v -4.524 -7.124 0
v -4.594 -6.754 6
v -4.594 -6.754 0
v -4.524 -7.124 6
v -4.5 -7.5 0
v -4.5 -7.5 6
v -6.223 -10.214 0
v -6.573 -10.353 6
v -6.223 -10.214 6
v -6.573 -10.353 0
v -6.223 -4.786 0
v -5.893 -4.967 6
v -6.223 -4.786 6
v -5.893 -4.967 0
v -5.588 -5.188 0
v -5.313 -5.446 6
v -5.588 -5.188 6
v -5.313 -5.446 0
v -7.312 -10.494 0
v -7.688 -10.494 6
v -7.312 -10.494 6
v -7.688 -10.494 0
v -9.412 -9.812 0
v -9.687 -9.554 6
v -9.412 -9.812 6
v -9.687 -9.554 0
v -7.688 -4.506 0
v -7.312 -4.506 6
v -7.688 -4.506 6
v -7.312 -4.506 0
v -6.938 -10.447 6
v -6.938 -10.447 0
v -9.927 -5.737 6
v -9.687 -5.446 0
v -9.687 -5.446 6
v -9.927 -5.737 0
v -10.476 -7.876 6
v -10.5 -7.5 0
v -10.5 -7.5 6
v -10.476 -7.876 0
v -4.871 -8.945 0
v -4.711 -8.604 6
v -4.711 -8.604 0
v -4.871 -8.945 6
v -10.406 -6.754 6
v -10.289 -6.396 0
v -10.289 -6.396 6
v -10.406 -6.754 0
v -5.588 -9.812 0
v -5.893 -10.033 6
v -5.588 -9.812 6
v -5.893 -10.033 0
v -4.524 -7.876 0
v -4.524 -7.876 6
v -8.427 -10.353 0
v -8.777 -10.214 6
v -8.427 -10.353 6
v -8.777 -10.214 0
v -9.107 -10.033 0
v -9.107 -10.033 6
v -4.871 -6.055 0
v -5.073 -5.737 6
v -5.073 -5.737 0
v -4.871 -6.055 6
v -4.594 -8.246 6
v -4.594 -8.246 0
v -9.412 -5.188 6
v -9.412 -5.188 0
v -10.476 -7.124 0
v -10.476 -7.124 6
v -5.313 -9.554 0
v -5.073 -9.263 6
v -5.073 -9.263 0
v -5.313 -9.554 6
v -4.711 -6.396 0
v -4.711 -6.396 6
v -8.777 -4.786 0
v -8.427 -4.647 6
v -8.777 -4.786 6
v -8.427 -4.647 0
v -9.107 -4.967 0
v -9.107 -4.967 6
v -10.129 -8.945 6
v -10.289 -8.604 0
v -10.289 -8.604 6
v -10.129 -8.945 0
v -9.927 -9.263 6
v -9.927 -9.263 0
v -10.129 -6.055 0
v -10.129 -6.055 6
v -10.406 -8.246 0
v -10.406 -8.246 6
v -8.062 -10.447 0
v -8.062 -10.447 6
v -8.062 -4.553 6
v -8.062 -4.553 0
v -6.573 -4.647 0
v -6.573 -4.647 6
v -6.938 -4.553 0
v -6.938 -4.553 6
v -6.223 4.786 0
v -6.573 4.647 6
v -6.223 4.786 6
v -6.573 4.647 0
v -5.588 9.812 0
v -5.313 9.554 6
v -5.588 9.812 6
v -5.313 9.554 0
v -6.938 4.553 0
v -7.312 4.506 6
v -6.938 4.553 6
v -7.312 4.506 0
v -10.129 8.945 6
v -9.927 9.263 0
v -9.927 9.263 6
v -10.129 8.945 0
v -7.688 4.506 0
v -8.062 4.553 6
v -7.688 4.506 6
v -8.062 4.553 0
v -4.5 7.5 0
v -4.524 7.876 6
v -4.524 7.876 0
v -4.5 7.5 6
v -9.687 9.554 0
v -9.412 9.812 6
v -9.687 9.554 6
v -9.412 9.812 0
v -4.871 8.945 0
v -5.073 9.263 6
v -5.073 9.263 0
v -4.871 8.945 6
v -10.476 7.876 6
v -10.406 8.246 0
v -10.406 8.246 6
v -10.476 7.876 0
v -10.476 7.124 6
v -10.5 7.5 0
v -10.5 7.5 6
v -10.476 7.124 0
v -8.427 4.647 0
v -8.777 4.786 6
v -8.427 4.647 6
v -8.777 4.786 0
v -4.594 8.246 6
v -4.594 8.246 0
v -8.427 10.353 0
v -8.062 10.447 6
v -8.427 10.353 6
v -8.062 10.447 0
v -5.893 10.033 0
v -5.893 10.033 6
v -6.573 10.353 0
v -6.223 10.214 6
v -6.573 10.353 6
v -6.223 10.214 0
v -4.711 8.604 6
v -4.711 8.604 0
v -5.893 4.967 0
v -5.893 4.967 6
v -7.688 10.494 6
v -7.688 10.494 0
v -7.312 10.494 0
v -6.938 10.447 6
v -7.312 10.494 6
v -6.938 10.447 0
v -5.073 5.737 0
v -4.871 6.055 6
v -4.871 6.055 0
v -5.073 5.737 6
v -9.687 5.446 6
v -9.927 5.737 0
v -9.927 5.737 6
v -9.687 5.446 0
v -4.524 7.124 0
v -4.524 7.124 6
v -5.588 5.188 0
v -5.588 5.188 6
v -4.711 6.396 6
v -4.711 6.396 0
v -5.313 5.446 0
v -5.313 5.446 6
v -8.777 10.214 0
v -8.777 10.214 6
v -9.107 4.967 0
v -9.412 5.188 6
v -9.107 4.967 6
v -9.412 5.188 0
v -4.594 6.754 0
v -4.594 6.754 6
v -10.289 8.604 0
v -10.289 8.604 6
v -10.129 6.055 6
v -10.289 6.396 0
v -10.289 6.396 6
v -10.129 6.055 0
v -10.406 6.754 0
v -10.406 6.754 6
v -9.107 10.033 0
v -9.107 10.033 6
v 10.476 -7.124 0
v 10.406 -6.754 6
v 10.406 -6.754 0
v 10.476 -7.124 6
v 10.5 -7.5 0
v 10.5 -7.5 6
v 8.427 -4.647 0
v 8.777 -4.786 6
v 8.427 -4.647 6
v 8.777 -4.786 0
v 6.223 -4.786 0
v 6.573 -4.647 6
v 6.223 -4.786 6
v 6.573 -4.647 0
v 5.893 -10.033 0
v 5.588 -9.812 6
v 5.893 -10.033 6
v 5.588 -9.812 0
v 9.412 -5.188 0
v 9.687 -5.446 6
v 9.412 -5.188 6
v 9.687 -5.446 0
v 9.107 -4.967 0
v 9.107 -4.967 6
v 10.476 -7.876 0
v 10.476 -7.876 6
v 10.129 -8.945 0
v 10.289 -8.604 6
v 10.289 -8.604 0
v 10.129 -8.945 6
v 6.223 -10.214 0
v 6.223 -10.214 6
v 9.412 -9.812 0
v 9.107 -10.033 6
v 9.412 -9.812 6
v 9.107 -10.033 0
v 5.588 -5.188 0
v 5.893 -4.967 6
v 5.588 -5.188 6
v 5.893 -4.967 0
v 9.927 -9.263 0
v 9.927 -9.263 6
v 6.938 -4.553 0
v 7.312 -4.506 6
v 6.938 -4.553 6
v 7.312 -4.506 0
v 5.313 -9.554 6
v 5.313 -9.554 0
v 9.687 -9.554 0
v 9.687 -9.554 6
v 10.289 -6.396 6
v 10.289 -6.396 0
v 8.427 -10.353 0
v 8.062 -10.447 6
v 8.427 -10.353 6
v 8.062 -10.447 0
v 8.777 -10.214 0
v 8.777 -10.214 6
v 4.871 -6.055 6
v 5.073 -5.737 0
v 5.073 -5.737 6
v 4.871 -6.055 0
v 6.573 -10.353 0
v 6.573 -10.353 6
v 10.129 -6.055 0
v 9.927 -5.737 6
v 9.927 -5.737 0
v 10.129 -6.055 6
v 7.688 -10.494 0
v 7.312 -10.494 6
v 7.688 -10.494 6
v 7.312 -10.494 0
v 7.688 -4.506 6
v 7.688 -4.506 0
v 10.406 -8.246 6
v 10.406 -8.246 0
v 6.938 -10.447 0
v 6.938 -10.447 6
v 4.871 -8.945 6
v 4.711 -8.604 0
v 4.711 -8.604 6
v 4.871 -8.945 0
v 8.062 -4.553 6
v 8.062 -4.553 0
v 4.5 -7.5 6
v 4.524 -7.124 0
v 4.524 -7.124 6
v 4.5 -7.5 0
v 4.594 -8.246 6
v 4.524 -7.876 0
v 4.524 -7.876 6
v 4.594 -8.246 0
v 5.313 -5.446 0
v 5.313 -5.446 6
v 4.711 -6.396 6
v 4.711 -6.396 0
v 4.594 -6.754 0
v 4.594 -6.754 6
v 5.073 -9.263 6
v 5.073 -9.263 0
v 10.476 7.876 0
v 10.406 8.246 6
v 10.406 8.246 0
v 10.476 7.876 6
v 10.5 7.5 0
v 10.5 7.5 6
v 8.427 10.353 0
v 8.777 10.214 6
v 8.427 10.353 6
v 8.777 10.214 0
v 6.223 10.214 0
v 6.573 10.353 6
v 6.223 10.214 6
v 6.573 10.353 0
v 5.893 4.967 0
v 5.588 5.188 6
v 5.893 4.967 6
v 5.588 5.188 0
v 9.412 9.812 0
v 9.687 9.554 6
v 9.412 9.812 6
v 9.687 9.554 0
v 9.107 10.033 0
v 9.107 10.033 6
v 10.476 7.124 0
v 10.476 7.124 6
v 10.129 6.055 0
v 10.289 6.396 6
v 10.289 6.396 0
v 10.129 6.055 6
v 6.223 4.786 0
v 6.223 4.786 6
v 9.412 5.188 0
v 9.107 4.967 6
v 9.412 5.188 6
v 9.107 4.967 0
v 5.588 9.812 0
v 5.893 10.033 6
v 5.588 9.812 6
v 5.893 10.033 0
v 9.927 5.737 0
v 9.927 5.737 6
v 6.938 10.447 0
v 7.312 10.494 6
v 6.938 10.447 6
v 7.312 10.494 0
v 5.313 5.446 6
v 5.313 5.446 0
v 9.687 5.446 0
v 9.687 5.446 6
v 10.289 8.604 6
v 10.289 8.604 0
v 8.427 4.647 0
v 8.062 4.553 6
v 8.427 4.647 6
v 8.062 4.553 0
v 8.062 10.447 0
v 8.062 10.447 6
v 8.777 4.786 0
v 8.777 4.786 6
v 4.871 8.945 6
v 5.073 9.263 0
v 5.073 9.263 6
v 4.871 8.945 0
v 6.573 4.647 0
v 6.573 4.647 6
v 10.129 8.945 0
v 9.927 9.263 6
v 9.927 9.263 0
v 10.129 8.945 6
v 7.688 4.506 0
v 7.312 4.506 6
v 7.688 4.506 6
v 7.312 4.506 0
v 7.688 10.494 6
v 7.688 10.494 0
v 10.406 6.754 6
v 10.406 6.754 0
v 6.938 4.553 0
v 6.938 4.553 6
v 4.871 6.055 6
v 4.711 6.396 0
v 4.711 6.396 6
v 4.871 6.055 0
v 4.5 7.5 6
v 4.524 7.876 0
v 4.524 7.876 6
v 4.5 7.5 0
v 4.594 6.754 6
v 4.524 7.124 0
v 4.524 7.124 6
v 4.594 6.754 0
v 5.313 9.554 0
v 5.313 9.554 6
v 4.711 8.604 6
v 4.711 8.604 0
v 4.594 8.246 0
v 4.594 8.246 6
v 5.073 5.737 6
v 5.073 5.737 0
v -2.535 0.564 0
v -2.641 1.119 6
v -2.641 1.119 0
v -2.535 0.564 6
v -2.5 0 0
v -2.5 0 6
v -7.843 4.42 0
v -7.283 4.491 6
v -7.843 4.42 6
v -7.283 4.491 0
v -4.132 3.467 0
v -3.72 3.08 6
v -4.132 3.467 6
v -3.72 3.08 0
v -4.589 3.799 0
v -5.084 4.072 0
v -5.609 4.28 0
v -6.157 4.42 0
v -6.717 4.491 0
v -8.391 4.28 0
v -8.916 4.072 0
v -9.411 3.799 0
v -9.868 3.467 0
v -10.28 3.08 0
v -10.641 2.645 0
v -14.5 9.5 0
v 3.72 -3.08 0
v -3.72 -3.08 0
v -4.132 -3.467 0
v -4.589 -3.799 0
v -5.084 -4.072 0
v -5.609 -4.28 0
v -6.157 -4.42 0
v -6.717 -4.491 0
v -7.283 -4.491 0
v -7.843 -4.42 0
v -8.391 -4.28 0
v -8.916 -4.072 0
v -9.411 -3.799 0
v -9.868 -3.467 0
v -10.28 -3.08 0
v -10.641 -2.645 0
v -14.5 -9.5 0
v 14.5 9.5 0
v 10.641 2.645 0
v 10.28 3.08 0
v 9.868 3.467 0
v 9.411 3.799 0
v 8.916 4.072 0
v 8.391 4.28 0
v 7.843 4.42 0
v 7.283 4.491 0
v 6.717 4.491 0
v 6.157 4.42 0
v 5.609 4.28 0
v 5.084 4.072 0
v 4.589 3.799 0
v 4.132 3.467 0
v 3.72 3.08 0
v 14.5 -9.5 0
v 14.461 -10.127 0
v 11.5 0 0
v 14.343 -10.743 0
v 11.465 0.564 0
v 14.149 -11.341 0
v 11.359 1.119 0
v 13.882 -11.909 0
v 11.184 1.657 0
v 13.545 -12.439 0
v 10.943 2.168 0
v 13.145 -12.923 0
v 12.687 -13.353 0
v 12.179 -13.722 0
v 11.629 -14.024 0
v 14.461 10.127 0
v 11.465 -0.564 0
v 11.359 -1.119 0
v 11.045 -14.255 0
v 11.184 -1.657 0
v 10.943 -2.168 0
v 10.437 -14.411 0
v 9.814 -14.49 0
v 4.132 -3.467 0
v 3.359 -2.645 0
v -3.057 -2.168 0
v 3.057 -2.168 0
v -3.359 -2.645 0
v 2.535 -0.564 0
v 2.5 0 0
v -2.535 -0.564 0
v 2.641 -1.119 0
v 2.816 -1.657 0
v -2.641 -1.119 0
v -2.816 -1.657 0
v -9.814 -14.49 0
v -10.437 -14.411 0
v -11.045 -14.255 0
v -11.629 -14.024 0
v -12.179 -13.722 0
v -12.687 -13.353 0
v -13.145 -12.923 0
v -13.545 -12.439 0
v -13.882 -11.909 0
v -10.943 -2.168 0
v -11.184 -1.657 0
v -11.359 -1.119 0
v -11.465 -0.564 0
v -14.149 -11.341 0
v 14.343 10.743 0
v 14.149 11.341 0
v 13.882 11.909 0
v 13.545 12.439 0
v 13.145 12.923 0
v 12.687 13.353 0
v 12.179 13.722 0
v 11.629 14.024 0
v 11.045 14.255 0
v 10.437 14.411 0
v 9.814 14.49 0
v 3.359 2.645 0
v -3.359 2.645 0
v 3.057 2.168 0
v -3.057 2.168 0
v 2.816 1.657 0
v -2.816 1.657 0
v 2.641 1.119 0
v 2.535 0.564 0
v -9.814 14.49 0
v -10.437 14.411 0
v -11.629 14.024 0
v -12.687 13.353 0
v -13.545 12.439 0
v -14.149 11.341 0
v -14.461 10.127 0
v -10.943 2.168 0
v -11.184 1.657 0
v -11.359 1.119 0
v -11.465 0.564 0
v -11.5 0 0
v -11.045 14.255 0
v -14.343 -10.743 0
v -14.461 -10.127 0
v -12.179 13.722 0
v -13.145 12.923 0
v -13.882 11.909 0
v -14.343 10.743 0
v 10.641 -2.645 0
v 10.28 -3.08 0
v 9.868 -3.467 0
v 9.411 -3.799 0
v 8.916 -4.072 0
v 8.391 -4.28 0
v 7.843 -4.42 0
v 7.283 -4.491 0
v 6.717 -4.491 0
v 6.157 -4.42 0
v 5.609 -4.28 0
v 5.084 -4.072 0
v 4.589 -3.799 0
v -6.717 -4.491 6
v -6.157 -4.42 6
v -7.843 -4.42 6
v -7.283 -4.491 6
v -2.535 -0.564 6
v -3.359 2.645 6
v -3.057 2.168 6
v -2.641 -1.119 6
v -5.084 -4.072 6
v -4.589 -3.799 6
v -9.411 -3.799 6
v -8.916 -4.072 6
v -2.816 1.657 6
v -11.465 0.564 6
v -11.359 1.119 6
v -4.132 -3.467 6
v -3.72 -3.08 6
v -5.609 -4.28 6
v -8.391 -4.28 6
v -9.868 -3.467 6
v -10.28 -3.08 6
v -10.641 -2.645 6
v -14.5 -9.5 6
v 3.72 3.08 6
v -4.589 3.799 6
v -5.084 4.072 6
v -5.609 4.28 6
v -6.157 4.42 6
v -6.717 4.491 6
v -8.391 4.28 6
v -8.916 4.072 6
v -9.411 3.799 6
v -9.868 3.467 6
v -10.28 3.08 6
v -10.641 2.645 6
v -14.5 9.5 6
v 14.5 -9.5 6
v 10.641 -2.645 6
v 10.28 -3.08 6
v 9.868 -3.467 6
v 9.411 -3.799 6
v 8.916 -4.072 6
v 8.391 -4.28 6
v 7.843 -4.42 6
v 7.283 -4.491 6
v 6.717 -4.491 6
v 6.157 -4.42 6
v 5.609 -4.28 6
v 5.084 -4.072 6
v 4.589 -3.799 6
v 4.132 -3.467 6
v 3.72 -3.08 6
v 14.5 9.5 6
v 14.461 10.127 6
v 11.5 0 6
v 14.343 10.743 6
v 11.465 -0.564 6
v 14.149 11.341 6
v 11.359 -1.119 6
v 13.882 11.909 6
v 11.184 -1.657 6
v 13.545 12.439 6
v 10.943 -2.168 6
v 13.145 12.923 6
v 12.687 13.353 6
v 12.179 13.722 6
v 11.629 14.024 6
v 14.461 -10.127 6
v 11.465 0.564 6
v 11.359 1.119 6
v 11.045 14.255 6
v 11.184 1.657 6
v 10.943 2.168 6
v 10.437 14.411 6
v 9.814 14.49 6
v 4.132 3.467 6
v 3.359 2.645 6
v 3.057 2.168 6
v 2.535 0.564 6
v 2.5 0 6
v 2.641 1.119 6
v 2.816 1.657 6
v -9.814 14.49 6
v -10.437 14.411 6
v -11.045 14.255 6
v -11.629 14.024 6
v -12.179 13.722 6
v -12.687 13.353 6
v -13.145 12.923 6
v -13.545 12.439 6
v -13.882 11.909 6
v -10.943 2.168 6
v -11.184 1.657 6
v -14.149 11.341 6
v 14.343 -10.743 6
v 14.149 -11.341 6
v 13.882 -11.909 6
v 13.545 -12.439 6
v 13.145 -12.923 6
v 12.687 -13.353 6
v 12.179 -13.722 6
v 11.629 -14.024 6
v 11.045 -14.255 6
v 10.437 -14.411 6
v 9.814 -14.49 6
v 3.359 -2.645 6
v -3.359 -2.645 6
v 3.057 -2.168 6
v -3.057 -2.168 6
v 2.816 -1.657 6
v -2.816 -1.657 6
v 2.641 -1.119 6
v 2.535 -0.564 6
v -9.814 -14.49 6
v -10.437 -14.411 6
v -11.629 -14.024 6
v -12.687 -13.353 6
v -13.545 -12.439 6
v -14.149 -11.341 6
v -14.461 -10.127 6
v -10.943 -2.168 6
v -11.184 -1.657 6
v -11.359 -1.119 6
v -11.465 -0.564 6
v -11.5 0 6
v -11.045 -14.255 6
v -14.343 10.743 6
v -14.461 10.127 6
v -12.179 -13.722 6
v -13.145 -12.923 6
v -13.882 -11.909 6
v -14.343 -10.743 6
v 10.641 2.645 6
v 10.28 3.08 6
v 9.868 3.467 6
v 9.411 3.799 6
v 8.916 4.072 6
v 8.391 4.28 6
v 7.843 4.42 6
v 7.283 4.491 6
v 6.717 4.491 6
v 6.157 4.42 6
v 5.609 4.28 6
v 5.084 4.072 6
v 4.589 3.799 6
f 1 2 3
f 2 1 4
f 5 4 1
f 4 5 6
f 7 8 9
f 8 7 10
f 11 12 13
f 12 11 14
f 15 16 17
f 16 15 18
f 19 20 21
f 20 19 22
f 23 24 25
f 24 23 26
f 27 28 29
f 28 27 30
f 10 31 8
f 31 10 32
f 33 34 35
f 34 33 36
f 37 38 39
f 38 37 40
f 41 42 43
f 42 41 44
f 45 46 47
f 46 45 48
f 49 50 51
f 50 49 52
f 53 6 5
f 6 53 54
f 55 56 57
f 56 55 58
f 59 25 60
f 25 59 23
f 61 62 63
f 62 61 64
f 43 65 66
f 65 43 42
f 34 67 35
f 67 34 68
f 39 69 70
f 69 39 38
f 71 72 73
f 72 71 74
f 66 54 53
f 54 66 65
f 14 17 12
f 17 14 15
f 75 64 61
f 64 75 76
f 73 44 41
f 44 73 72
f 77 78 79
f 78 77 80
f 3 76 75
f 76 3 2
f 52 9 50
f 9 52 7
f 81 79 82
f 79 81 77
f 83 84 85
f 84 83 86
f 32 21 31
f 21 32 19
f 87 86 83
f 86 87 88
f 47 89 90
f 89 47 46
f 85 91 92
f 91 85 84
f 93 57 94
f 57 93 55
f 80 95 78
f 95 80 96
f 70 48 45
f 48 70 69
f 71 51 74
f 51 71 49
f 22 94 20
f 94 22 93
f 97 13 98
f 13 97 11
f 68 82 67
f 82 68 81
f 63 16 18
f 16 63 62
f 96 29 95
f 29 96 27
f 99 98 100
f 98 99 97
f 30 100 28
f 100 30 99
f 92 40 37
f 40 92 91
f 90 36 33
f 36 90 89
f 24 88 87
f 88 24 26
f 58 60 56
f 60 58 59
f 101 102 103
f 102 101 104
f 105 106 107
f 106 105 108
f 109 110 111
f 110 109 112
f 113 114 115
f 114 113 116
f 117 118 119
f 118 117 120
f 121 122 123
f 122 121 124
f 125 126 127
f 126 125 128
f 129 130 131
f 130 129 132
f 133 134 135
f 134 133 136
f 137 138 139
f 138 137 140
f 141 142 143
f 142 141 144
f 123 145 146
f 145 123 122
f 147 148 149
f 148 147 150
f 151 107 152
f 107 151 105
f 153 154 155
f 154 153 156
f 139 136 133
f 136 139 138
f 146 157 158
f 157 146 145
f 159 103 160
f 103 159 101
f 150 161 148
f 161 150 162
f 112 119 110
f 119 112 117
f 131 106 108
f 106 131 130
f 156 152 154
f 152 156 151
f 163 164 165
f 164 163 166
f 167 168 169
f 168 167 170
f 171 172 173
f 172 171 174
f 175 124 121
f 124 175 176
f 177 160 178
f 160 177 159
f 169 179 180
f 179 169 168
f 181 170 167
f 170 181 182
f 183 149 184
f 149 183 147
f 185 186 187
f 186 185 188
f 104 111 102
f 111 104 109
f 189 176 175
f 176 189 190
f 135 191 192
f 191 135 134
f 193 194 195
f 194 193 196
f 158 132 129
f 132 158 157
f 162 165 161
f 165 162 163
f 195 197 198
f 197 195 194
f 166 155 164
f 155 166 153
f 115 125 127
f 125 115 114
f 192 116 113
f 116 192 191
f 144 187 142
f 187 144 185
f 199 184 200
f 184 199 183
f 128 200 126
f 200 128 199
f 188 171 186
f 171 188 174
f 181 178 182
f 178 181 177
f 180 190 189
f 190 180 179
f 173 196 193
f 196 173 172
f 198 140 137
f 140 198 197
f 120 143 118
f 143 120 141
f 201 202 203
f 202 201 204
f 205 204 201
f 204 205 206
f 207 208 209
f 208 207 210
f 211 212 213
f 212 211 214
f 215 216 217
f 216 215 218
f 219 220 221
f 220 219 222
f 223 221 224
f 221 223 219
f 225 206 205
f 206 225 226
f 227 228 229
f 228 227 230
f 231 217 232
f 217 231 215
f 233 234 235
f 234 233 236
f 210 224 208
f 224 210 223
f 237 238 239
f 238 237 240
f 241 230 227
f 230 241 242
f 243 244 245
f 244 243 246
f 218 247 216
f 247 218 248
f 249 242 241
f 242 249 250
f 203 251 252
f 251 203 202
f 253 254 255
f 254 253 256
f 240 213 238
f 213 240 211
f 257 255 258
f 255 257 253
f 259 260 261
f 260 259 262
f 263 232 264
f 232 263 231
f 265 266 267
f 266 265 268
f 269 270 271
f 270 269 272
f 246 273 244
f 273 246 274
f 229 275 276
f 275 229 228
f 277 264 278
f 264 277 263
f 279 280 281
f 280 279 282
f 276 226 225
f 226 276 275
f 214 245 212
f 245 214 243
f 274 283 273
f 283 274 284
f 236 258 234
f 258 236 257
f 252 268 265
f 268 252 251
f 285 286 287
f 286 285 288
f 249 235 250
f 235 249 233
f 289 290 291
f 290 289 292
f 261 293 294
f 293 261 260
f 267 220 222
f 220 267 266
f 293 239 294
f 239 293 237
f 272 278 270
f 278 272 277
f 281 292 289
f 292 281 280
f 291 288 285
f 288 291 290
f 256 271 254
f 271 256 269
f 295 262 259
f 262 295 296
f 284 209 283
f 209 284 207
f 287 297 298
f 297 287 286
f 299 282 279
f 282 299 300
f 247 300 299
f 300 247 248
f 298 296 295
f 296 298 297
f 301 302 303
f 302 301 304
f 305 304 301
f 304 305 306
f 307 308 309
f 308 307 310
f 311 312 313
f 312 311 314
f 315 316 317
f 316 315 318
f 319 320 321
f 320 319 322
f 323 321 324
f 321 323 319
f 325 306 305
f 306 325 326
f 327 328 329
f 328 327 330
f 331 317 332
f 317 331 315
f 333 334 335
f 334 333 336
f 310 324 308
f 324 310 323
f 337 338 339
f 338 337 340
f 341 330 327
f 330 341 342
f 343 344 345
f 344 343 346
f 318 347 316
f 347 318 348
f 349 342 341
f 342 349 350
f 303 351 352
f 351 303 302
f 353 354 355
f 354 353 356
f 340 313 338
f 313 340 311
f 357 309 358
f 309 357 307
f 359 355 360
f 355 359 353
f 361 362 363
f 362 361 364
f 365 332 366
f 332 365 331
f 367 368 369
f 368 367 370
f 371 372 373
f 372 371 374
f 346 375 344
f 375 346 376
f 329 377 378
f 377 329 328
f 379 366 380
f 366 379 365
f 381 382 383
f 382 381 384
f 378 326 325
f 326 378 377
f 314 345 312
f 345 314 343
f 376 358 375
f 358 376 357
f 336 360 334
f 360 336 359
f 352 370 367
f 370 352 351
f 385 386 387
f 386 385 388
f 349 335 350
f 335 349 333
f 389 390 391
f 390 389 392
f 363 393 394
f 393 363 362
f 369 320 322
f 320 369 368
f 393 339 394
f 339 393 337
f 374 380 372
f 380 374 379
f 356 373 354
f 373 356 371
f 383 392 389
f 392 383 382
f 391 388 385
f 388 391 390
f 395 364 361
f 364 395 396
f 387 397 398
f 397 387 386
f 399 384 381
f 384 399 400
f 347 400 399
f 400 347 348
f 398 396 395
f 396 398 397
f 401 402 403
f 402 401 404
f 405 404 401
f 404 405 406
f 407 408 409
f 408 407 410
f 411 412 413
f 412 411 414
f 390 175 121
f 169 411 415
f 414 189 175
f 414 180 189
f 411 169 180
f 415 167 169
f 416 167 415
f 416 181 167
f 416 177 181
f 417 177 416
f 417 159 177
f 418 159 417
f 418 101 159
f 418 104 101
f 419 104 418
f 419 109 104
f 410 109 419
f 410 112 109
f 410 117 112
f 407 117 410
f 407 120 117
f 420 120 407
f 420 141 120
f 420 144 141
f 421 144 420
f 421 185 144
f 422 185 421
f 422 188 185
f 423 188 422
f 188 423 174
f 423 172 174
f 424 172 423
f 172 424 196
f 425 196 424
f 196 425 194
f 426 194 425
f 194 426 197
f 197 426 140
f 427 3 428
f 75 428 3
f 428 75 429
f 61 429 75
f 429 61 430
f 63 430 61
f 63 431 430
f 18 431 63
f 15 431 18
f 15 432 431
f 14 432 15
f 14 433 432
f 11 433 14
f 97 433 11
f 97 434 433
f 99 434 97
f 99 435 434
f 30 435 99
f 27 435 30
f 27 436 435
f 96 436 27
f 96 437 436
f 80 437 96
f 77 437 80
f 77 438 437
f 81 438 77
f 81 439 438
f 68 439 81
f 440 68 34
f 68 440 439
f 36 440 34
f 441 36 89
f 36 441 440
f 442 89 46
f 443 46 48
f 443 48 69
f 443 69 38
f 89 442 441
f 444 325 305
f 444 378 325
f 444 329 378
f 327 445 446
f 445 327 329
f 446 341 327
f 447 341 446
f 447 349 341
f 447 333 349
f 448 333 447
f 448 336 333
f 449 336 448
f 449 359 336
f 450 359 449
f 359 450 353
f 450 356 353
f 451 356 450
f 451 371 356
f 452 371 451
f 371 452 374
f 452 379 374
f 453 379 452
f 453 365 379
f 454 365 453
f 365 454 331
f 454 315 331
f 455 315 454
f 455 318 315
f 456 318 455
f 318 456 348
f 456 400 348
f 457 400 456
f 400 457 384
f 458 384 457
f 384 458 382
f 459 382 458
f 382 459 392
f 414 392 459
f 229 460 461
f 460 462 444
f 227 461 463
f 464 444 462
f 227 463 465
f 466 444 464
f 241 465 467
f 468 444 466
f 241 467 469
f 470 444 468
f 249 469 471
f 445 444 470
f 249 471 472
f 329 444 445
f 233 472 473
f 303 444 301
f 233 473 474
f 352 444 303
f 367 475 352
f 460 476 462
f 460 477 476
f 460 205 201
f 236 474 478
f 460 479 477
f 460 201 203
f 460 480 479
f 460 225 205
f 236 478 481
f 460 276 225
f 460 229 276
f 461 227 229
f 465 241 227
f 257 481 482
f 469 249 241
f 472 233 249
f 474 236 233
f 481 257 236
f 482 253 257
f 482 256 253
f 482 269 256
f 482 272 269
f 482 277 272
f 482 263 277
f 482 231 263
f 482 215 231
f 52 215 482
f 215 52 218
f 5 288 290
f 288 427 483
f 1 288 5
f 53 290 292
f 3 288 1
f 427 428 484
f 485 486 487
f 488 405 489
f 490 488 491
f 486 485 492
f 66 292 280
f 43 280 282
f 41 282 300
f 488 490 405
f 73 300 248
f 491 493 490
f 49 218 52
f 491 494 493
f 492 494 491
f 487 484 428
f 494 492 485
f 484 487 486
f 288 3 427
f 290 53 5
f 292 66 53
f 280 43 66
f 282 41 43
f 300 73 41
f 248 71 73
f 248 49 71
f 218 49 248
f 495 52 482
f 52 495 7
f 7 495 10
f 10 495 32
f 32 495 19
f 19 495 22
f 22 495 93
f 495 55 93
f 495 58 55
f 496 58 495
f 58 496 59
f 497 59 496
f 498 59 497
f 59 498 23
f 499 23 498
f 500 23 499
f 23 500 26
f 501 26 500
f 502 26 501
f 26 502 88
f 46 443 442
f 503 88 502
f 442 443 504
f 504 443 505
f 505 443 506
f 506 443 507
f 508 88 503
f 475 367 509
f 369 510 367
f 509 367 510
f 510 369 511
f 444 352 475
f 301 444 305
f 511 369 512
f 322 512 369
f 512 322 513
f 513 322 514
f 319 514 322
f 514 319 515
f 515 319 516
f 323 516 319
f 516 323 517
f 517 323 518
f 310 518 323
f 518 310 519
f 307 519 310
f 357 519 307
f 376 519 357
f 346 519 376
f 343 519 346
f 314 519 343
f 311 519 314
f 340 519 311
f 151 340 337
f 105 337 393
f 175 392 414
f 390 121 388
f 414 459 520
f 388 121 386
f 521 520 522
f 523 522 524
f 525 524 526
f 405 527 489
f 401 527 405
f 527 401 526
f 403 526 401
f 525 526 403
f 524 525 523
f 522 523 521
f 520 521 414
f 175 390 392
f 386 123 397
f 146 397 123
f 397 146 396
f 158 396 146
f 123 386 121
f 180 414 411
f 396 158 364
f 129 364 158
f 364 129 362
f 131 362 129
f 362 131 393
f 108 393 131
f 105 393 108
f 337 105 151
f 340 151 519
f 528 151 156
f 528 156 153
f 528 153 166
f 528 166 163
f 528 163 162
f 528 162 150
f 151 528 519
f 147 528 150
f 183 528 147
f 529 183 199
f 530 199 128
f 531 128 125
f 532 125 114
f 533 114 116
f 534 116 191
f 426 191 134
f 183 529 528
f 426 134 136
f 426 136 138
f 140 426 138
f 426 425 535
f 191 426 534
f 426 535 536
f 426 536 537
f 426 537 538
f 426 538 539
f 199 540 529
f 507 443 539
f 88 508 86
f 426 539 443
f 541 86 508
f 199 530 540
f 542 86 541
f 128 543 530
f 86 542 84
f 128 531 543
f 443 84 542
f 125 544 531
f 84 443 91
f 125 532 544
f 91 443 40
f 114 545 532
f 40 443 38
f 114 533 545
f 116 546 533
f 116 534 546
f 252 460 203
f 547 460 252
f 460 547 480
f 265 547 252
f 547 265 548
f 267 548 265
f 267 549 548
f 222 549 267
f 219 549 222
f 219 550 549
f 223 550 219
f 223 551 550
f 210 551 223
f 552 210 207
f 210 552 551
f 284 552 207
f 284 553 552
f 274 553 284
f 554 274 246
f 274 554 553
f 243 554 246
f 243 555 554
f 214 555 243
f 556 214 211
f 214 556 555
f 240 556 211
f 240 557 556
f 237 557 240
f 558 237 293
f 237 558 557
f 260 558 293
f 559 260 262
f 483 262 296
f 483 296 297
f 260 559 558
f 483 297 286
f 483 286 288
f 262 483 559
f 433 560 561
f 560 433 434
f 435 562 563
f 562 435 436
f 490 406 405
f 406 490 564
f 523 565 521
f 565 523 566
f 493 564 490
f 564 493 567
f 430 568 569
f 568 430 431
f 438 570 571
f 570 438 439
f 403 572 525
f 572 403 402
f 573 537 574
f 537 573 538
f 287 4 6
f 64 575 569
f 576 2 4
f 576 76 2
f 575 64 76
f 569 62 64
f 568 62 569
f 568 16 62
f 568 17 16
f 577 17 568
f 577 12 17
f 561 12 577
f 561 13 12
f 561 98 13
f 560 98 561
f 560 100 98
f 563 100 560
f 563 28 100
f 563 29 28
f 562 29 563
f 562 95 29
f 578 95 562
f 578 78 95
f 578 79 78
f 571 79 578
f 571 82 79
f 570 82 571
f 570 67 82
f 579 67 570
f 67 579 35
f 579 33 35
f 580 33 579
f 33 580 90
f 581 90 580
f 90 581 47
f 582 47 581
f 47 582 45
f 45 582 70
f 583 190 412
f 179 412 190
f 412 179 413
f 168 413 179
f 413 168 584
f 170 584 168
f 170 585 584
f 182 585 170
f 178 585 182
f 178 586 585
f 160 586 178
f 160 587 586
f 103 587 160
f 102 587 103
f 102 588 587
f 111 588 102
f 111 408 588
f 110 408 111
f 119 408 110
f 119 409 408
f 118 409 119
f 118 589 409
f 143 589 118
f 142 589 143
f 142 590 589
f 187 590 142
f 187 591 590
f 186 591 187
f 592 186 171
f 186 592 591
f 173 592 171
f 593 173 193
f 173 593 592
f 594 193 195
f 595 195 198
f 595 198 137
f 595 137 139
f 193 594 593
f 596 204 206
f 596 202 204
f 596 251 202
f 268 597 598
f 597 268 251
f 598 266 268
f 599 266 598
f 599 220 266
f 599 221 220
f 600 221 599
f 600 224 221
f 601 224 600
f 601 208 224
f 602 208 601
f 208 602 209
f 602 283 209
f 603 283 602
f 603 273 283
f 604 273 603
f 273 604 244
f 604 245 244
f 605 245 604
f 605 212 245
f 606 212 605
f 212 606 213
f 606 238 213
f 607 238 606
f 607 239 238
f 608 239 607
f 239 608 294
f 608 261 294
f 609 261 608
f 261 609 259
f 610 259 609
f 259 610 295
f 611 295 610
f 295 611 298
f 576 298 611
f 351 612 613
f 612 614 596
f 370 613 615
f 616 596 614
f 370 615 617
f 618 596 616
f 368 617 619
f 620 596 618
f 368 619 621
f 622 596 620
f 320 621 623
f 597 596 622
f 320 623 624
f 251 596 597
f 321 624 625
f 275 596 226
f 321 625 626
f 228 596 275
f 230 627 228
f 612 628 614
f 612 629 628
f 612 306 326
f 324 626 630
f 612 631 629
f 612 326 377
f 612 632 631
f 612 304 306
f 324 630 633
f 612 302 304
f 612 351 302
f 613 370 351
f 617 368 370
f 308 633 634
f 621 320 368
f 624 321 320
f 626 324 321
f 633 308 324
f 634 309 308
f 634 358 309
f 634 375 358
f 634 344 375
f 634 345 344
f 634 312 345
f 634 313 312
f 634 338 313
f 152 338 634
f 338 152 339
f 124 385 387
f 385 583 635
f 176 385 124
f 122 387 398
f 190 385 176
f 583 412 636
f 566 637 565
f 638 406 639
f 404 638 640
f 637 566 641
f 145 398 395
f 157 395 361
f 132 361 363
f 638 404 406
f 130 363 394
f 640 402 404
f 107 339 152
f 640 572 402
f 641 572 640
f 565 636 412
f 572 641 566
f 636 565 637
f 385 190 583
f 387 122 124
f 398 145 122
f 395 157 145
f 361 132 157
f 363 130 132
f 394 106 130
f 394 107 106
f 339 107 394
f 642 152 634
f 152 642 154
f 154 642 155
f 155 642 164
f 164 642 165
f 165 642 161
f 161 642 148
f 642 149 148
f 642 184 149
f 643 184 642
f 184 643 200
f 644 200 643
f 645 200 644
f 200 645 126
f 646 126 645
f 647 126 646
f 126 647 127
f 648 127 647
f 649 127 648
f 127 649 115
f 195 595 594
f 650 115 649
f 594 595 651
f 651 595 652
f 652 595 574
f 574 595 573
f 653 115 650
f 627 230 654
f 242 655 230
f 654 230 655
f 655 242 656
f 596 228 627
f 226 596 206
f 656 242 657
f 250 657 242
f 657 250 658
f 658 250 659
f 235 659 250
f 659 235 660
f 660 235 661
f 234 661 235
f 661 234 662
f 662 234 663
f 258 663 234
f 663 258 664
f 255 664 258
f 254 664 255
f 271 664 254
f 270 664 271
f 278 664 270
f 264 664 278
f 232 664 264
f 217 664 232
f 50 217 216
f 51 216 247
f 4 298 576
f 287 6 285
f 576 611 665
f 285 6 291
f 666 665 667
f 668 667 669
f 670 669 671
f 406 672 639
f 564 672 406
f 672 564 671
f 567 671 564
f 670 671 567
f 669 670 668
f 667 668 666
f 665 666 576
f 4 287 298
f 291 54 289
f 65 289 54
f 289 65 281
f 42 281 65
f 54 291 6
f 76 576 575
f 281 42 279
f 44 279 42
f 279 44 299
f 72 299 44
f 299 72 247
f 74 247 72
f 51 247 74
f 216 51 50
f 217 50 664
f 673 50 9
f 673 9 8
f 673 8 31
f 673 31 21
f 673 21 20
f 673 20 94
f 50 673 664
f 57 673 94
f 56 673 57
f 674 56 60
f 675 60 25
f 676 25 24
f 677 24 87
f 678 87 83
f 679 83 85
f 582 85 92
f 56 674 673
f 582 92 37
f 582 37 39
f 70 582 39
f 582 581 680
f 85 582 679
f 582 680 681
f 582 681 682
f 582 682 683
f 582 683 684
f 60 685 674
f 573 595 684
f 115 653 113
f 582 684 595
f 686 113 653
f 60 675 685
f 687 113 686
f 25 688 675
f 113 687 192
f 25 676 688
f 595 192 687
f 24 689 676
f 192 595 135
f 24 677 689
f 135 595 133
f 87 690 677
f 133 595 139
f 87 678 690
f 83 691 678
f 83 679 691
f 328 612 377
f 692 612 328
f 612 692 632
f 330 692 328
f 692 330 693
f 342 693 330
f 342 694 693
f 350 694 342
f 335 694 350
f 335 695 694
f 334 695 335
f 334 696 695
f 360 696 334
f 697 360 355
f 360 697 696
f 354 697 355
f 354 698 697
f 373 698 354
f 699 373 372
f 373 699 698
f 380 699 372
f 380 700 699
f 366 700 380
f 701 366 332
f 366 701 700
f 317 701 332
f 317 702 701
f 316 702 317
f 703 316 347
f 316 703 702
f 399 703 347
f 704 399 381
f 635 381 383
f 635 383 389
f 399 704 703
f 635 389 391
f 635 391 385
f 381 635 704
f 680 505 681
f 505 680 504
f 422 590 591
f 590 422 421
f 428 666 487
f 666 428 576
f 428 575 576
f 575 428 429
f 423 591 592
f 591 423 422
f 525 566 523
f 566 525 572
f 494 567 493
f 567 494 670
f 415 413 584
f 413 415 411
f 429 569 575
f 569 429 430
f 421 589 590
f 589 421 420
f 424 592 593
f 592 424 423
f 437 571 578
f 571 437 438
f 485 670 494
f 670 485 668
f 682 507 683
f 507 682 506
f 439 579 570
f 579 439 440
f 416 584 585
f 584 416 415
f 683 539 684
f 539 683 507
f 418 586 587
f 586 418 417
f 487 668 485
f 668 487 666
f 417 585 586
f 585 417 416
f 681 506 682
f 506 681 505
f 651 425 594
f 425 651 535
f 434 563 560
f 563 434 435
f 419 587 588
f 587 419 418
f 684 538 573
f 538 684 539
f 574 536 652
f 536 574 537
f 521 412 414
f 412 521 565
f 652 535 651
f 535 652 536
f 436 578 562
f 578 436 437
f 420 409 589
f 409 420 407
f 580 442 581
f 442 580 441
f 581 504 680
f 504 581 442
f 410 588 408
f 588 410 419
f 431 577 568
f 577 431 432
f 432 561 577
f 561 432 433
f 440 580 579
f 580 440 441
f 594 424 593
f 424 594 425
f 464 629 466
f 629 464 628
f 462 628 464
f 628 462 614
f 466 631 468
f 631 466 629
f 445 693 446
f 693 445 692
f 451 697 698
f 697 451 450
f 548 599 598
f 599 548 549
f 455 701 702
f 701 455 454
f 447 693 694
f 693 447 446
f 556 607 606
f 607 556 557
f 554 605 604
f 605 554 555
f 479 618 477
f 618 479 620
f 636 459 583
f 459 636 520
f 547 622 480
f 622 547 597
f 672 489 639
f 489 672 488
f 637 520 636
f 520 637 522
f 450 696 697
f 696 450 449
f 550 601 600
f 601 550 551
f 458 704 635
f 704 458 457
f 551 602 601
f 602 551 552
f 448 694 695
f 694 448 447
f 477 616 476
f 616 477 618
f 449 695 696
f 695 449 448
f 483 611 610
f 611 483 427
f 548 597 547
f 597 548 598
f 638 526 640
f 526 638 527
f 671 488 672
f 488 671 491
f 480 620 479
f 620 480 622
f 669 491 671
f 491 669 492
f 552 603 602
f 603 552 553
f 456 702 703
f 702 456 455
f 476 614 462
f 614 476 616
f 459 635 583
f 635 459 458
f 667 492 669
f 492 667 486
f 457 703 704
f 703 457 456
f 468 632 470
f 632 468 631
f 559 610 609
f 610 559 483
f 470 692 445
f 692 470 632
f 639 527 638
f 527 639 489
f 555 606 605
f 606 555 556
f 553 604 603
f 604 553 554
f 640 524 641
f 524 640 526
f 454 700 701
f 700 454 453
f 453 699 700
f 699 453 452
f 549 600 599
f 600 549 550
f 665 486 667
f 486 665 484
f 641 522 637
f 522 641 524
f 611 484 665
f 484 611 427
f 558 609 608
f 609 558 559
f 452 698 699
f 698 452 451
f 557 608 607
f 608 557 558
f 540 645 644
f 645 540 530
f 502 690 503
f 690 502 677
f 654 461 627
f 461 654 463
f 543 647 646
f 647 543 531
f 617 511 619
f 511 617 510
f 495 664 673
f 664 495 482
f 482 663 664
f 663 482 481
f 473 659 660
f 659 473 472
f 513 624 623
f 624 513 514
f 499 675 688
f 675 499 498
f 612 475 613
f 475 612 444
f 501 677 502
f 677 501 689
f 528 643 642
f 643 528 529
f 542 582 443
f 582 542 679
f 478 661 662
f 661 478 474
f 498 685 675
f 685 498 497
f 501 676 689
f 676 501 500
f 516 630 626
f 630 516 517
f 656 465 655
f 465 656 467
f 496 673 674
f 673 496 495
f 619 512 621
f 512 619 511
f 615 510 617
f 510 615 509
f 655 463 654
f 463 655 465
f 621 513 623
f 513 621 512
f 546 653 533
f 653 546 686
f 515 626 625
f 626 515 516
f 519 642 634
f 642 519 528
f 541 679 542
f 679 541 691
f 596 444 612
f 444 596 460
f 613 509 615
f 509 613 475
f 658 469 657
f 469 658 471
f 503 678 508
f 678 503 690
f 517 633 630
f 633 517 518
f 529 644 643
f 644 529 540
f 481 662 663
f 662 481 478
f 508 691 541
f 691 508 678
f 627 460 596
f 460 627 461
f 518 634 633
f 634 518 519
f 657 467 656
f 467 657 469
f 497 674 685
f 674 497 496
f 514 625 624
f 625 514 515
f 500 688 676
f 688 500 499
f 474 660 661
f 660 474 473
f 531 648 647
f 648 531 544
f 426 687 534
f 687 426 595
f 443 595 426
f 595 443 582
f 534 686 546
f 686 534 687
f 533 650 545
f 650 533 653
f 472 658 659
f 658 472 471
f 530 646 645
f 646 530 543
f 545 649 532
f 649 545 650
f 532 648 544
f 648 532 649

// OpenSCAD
$fn = 50;


difference() {
	union() {
		hull() {
			translate(v = [-9.5000000000, 9.5000000000, 0]) {
				cylinder(h = 6, r = 5);
			}
			translate(v = [9.5000000000, 9.5000000000, 0]) {
				cylinder(h = 6, r = 5);
			}
			translate(v = [-9.5000000000, -9.5000000000, 0]) {
				cylinder(h = 6, r = 5);
			}
			translate(v = [9.5000000000, -9.5000000000, 0]) {
				cylinder(h = 6, r = 5);
			}
		}
	}
	union() {
		#translate(v = [-7.5000000000, -7.5000000000, -100.0000000000]) {
			cylinder(h = 200, r = 3.0000000000);
		}
		#translate(v = [-7.5000000000, 7.5000000000, -100.0000000000]) {
			cylinder(h = 200, r = 3.0000000000);
		}
		#translate(v = [7.5000000000, -7.5000000000, -100.0000000000]) {
			cylinder(h = 200, r = 3.0000000000);
		}
		#translate(v = [7.5000000000, 7.5000000000, -100.0000000000]) {
			cylinder(h = 200, r = 3.0000000000);
		}
		#translate(v = [-7.0000000000, 0, 0]) {
			cylinder(h = 6, r = 4.5000000000);
		}
		#translate(v = [7.0000000000, 0, 0]) {
			cylinder(h = 6, r = 4.5000000000);
		}
	}
}
